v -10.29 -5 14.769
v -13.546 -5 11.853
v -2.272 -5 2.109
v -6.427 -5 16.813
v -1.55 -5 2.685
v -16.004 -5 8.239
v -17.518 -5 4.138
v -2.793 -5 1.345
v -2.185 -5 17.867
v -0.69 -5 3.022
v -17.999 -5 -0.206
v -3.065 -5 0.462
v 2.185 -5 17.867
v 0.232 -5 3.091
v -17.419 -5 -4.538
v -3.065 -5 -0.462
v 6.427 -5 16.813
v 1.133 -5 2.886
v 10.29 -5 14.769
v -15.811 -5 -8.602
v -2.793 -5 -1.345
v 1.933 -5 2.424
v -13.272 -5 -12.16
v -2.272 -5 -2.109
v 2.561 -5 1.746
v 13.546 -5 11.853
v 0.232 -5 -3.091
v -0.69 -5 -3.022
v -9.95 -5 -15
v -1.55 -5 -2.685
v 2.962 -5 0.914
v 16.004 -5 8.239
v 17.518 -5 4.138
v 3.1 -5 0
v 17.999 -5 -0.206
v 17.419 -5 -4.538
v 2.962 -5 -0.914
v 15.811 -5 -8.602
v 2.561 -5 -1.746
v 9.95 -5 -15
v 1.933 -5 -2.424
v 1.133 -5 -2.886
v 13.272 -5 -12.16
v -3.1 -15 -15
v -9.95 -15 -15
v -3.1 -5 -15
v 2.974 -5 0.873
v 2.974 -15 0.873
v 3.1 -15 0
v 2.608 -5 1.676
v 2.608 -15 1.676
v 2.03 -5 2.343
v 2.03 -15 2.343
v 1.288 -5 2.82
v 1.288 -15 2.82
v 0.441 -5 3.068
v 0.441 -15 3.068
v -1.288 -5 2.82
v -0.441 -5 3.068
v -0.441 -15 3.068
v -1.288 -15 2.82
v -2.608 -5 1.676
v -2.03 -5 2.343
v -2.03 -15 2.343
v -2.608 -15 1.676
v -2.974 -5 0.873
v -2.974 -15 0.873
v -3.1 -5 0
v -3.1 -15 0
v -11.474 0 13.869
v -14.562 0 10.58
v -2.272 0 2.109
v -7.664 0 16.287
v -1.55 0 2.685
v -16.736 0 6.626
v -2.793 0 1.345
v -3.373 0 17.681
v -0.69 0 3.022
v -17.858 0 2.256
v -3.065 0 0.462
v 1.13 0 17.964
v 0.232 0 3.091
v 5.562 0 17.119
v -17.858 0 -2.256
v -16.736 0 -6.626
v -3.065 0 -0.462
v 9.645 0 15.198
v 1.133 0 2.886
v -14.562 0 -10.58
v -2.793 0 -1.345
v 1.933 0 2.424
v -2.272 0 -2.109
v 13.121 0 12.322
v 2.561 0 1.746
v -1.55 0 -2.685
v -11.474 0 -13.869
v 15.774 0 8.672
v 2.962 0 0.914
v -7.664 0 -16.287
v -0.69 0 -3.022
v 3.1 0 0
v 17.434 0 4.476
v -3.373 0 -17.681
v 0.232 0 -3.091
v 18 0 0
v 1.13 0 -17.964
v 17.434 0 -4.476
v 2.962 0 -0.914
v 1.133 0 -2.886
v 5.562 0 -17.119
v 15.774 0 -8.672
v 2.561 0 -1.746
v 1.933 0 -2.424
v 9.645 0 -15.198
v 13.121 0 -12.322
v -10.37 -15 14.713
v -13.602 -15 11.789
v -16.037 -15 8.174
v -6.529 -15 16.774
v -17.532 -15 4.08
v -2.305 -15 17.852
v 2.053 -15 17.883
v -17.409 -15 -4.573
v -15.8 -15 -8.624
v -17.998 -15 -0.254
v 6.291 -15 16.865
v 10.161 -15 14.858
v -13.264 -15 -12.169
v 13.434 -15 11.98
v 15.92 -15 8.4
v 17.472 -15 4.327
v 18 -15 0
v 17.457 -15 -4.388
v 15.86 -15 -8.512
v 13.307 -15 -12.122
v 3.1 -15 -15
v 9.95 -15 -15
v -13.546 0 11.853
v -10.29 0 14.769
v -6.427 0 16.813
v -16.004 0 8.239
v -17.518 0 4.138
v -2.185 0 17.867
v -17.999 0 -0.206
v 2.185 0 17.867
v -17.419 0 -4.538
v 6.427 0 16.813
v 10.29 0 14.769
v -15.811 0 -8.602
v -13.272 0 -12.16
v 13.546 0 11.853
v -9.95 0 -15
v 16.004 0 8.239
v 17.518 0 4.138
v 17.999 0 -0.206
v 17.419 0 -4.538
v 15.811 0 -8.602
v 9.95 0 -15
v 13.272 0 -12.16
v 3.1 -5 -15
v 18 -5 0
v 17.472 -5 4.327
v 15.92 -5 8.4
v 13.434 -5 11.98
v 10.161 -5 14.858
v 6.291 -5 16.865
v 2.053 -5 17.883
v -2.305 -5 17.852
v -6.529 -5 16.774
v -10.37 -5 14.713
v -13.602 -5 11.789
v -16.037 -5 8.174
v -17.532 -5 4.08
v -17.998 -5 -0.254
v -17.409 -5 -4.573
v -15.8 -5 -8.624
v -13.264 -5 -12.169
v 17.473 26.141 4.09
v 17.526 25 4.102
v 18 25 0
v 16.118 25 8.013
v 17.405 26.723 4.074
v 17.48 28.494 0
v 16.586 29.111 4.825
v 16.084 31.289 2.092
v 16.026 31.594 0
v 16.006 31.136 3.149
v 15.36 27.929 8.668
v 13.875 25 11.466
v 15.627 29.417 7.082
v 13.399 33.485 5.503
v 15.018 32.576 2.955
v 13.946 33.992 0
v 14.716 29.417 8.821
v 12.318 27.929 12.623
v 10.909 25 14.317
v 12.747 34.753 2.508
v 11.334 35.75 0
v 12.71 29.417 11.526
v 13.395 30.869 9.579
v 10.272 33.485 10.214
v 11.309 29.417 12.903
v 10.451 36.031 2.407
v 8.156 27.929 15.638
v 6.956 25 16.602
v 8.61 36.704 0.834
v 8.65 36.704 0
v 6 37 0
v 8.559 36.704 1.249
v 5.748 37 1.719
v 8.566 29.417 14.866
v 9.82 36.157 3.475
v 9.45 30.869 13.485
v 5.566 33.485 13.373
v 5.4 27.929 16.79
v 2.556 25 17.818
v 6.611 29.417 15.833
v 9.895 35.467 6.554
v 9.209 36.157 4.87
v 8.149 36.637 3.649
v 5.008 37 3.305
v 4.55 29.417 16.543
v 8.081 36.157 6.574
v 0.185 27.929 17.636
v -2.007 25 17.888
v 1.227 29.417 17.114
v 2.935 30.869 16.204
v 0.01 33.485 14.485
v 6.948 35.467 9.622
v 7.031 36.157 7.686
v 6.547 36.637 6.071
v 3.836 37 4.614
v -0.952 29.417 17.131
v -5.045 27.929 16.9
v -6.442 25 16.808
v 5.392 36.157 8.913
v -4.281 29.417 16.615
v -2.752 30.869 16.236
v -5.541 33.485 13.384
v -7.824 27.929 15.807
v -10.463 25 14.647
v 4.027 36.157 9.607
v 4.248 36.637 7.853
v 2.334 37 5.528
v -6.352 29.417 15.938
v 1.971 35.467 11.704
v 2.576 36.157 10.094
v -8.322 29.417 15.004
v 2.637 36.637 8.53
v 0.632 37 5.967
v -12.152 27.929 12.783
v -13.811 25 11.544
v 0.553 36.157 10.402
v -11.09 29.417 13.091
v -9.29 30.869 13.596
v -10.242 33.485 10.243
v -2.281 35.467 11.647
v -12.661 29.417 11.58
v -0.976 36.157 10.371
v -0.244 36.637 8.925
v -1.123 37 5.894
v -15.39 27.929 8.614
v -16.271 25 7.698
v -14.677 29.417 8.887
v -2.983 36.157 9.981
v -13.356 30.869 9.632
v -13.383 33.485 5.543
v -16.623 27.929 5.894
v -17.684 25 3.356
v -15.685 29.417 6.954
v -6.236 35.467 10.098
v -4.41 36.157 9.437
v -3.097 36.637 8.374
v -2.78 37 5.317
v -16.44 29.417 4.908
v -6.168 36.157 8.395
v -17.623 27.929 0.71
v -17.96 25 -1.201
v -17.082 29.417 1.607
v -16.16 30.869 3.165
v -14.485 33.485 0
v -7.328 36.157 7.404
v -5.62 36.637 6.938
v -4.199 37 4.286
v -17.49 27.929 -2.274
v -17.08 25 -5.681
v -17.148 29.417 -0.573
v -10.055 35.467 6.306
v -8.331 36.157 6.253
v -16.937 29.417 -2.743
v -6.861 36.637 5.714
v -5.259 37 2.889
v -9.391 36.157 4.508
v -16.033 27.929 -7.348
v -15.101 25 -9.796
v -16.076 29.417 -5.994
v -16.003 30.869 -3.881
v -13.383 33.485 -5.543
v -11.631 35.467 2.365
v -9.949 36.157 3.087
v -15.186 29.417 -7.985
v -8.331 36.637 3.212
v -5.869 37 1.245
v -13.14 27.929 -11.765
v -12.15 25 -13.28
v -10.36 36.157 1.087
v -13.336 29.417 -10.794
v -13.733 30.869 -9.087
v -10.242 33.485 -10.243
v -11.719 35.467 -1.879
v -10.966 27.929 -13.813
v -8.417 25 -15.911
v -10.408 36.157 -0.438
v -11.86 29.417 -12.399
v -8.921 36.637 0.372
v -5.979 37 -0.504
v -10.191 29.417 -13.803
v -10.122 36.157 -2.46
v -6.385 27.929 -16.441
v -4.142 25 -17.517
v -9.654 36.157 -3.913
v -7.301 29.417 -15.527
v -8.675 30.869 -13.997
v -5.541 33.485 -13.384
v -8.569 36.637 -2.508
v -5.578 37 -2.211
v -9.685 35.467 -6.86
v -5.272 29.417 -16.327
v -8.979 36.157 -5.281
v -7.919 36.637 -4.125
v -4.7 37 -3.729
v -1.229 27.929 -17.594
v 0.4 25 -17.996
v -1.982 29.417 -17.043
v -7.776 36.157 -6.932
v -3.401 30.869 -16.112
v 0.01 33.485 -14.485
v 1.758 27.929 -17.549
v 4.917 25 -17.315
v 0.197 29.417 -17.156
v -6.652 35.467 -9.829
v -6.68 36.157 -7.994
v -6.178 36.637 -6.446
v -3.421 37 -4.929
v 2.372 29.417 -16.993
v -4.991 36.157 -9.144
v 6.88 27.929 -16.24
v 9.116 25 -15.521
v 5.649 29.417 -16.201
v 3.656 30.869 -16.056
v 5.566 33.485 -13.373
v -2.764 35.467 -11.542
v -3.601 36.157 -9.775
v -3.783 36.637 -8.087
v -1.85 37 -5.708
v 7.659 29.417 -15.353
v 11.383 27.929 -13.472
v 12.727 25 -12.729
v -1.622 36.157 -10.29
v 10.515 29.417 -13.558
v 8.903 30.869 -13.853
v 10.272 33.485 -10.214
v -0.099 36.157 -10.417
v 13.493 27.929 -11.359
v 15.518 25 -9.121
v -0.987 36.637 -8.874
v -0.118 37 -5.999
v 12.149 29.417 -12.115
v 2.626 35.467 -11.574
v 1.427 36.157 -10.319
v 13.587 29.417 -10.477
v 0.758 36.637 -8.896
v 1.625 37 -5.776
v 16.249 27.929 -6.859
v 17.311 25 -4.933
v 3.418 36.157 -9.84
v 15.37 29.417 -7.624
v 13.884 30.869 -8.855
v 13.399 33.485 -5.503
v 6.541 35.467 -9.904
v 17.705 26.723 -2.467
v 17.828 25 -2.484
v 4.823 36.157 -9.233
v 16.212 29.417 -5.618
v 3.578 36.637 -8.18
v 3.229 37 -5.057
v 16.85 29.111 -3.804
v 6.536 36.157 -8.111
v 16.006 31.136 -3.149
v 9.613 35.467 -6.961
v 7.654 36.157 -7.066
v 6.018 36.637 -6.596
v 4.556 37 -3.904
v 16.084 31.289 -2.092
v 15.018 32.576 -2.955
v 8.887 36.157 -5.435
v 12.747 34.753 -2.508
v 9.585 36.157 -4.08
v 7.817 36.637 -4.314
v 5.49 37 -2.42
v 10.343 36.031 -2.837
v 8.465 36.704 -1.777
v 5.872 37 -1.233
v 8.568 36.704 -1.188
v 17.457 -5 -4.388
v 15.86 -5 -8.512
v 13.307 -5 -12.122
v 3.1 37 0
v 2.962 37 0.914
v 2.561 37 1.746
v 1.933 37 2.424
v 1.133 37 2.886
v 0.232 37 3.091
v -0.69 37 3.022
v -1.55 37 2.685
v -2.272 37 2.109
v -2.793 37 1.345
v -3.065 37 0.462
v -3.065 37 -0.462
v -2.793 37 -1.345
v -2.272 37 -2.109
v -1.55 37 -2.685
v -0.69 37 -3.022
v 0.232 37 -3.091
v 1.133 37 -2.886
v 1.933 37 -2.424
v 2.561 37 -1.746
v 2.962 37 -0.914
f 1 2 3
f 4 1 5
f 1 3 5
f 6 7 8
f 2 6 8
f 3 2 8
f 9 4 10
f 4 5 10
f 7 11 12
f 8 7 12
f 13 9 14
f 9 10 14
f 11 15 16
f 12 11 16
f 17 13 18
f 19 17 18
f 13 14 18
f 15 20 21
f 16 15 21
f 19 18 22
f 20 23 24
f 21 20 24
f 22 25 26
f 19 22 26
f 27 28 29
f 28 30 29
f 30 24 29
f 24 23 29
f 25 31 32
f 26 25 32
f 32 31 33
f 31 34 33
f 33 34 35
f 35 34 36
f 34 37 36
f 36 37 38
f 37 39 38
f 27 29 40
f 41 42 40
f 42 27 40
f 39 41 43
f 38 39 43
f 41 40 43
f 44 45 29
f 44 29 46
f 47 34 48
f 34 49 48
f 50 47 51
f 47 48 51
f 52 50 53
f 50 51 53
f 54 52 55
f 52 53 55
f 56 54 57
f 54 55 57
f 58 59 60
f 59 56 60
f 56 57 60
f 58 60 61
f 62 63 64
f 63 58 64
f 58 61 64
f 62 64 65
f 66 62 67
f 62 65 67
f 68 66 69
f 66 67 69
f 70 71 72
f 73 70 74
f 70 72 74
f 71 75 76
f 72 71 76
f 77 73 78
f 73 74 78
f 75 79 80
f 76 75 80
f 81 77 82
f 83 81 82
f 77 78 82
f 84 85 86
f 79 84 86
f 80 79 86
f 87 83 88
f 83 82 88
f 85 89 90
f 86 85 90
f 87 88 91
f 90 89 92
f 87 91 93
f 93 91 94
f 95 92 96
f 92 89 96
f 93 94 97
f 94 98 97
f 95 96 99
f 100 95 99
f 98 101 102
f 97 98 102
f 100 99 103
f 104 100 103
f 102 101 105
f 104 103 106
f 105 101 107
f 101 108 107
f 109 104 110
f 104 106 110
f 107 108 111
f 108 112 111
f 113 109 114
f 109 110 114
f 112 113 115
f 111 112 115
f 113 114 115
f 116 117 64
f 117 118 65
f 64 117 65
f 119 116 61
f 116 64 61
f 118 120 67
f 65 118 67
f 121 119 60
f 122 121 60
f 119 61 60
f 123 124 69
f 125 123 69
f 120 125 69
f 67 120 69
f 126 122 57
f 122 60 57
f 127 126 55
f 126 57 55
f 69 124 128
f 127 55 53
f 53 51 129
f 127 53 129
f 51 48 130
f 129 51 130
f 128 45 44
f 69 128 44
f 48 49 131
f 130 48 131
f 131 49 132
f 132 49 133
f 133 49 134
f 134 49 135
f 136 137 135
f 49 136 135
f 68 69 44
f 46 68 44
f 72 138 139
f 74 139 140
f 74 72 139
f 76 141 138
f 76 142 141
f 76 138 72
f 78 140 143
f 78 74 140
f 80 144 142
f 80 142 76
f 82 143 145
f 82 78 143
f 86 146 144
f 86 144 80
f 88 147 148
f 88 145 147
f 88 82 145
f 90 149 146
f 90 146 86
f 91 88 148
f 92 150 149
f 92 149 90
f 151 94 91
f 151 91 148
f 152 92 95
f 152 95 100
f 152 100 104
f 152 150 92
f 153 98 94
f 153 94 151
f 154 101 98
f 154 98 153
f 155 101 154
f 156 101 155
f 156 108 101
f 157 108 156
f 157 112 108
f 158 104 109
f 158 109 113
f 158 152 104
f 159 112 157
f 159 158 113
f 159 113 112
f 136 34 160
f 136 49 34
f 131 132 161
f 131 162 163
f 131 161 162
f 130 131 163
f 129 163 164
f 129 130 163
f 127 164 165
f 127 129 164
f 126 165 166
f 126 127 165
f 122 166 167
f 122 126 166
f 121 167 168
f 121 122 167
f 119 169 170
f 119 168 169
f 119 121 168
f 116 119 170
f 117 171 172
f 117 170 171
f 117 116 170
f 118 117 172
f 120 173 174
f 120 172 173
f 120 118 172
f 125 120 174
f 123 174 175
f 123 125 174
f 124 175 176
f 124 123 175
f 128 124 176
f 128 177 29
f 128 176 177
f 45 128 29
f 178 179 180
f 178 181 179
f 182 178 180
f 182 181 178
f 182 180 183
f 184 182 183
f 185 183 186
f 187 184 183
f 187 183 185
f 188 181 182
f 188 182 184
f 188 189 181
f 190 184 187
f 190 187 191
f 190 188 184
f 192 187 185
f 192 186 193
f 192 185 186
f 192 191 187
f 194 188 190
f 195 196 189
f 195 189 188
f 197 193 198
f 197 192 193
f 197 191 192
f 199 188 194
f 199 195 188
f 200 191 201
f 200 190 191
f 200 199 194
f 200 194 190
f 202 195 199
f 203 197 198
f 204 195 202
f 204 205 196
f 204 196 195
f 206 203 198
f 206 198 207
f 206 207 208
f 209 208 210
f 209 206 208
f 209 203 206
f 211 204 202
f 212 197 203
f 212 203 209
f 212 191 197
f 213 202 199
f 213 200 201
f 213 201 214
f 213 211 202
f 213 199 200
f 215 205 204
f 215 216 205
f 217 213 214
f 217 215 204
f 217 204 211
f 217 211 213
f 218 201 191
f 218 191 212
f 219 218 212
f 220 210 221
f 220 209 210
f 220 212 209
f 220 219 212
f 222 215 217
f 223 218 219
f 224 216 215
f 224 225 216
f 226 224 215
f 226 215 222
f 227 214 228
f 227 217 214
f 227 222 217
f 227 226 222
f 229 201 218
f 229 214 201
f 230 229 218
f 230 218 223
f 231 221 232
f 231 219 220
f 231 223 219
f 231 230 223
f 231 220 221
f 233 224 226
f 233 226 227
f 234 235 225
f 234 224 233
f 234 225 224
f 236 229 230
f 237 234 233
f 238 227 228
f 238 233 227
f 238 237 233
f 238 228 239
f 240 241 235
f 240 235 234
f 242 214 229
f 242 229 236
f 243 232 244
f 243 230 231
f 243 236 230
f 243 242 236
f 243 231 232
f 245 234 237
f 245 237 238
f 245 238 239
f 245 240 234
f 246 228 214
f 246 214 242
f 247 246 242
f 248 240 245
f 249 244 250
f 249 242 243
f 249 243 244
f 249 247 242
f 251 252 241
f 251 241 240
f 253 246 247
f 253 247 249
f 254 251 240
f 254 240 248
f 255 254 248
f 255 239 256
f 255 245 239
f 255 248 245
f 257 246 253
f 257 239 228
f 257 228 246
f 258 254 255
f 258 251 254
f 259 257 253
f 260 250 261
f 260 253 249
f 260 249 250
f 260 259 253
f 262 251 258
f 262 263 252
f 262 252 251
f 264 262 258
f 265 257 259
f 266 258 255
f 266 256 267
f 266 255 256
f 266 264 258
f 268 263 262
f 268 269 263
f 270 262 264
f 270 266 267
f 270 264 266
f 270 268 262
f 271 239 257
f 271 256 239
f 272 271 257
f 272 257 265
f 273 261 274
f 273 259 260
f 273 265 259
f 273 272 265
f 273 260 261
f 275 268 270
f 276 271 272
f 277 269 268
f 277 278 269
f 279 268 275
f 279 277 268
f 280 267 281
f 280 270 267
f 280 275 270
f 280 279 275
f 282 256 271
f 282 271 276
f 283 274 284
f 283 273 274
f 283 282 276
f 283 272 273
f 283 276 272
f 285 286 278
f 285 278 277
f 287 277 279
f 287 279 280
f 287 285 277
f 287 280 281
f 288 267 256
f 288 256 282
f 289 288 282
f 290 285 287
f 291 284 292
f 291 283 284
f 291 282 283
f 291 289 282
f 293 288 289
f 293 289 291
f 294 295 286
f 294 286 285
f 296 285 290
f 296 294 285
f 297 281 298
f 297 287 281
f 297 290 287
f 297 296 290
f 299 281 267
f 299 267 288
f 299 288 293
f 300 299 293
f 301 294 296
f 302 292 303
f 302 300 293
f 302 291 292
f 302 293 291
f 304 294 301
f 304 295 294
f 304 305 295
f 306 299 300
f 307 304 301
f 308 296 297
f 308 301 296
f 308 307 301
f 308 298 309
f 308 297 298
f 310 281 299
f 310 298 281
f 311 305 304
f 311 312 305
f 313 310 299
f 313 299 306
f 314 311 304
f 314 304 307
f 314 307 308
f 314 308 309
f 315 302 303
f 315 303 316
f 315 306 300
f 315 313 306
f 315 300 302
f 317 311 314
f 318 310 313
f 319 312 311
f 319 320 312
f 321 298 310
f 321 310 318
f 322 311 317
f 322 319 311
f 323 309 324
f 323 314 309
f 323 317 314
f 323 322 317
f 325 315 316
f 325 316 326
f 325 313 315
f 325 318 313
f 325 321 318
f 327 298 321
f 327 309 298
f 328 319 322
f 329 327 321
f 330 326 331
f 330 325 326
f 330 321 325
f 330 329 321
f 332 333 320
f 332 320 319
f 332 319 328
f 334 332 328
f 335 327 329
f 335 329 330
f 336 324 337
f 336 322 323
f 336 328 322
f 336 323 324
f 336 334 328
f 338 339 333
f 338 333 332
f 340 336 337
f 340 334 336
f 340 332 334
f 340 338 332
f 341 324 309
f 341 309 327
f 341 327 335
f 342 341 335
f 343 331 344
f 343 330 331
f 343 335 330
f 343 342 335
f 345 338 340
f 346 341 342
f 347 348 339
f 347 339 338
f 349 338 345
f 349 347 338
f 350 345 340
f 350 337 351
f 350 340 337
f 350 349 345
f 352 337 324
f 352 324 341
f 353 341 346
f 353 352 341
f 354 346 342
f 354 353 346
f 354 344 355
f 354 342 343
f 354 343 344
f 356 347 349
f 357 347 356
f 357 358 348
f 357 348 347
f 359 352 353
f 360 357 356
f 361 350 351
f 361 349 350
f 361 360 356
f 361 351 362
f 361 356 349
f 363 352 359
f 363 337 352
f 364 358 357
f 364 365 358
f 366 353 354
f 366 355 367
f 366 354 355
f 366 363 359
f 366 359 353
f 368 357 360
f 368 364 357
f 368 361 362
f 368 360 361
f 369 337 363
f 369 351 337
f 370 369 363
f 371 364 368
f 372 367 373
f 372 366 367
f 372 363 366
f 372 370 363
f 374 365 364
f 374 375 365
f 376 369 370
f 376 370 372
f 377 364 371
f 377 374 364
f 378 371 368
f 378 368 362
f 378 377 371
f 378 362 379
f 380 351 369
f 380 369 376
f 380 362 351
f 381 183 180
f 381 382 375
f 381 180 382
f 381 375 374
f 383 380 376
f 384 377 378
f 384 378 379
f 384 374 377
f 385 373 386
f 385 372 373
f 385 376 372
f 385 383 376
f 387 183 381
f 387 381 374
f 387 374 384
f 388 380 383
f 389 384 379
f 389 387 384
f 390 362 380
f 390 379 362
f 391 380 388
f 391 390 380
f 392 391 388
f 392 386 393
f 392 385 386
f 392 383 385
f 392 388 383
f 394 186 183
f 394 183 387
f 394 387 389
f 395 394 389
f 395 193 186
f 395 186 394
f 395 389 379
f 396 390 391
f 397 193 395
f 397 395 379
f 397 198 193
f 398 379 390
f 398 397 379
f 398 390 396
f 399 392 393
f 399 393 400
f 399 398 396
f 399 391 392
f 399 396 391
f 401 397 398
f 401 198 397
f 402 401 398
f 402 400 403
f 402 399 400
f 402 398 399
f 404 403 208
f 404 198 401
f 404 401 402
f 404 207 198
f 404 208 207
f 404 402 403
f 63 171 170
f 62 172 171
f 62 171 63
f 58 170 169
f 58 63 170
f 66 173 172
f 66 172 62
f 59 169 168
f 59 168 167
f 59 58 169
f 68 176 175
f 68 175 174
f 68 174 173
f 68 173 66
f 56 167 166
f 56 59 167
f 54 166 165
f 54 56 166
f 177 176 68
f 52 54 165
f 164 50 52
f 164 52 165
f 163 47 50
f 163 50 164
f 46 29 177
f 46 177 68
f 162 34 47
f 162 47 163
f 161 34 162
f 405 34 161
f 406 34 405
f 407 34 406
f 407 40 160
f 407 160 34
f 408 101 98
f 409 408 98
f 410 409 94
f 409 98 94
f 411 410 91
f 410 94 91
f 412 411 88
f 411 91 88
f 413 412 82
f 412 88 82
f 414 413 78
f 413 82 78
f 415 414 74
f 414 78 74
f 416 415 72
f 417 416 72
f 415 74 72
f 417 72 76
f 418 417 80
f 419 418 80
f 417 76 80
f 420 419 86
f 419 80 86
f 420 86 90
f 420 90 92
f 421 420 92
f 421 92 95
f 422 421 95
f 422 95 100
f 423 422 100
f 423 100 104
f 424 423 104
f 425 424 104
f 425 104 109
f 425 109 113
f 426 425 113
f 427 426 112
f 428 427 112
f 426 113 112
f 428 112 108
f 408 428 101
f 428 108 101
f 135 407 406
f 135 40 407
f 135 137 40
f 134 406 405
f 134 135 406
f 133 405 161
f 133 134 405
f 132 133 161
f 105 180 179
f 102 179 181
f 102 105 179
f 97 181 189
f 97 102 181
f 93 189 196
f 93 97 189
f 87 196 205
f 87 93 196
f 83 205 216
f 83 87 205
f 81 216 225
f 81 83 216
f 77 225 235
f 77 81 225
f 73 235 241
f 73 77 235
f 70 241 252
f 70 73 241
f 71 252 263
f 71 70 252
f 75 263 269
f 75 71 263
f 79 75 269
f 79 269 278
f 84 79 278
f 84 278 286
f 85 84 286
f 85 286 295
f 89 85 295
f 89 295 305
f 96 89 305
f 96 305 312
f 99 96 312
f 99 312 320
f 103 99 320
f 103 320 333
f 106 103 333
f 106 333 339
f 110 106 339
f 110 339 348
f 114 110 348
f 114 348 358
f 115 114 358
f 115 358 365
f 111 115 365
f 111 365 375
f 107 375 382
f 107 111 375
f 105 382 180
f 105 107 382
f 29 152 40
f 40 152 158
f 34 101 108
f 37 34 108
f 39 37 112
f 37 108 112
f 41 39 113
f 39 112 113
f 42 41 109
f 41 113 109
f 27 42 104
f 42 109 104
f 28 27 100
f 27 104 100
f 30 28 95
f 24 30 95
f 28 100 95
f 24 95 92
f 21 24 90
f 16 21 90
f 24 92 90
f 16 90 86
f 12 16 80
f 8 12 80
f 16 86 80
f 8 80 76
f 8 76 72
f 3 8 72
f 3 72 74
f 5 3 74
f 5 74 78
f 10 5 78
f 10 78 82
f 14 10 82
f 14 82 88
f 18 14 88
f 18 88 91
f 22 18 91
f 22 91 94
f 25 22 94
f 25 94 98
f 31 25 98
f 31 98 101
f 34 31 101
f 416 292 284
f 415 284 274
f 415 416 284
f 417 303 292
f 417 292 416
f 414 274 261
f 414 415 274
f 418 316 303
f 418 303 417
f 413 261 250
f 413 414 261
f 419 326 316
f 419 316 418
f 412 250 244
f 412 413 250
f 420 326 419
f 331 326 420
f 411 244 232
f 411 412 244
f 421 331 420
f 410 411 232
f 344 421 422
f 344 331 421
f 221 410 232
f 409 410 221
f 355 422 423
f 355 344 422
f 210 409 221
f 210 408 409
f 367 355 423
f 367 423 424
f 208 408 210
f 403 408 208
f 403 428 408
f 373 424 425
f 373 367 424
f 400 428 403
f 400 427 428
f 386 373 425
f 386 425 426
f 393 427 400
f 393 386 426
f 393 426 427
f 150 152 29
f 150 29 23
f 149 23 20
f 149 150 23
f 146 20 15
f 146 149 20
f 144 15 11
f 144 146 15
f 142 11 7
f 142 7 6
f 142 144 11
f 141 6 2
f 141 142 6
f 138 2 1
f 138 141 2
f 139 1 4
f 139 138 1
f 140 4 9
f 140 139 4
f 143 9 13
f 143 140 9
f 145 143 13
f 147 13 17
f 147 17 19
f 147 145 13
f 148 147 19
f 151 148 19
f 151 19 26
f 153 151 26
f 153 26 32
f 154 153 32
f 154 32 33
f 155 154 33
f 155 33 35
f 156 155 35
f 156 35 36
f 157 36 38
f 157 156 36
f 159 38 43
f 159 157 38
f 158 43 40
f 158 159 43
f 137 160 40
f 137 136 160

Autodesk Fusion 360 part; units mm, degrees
sketch "Sketch1" plane through (0, 0, 0) normal (0, 1, 0) x (1, 0, 0)
  circle A0 centre (0, 0) radius 3.1
  circle A1 centre (0, 0) radius 18
  line L0 (-20, 0) -> (-20, 15)
  line L1 (-20, 15) -> (20, 15)
  line L2 (-3.1, 0) -> (-3.1, 26.7425)
  line L3 (3.1, 0) -> (3.1, 30)
  dimension "d1" = 6.2
  dimension "d2" = 36
  dimension "d3" = 15
extrude "Extrude1" add sketch "Sketch1" along normal blind 29 contours A0 A1 L1 L2 L3 | A0 L1 L2 L3 | A1 L1 L3 | A1 L1 L2 L3 | A1 L1 L2 makes body 1
extrude "Extrude2" add sketch "Sketch1" against normal blind 5 separate body contours A0 A1 L1 L2 L3 | A0 L1 L2 L3 makes body 2
ref_plane "WorkPlane1" through (0, -15, 0) normal (0, 1, 0) x (1, 0, 0)
sketch "Sketch2" plane through (0, -15, 0) normal (0, 1, 0) x (1, 0, 0)
  circle A0 centre (0, 0) radius 18
  line L0 (-20, 15) -> (20, 15)
  line L1 (3.1, 0) -> (3.1, 30)
  line L2 (-3.1, 0) -> (-3.1, 26.7425)
  circle A1 centre (0, 0) radius 3.1
extrude "Extrude3" add sketch "Sketch2" along normal blind 10 separate body contours A0 L0 L1 L2 A1 makes body 3
extrude "Extrude4" add 1 faces at (12.9663, 29, -0.8943) along direction (0, 1, 0) blind 8 on bodies 1 bodies 1
fillet "Fillet1" radius 12 1 edges at (-16.7819, 37, 6.5091) on bodies 1
